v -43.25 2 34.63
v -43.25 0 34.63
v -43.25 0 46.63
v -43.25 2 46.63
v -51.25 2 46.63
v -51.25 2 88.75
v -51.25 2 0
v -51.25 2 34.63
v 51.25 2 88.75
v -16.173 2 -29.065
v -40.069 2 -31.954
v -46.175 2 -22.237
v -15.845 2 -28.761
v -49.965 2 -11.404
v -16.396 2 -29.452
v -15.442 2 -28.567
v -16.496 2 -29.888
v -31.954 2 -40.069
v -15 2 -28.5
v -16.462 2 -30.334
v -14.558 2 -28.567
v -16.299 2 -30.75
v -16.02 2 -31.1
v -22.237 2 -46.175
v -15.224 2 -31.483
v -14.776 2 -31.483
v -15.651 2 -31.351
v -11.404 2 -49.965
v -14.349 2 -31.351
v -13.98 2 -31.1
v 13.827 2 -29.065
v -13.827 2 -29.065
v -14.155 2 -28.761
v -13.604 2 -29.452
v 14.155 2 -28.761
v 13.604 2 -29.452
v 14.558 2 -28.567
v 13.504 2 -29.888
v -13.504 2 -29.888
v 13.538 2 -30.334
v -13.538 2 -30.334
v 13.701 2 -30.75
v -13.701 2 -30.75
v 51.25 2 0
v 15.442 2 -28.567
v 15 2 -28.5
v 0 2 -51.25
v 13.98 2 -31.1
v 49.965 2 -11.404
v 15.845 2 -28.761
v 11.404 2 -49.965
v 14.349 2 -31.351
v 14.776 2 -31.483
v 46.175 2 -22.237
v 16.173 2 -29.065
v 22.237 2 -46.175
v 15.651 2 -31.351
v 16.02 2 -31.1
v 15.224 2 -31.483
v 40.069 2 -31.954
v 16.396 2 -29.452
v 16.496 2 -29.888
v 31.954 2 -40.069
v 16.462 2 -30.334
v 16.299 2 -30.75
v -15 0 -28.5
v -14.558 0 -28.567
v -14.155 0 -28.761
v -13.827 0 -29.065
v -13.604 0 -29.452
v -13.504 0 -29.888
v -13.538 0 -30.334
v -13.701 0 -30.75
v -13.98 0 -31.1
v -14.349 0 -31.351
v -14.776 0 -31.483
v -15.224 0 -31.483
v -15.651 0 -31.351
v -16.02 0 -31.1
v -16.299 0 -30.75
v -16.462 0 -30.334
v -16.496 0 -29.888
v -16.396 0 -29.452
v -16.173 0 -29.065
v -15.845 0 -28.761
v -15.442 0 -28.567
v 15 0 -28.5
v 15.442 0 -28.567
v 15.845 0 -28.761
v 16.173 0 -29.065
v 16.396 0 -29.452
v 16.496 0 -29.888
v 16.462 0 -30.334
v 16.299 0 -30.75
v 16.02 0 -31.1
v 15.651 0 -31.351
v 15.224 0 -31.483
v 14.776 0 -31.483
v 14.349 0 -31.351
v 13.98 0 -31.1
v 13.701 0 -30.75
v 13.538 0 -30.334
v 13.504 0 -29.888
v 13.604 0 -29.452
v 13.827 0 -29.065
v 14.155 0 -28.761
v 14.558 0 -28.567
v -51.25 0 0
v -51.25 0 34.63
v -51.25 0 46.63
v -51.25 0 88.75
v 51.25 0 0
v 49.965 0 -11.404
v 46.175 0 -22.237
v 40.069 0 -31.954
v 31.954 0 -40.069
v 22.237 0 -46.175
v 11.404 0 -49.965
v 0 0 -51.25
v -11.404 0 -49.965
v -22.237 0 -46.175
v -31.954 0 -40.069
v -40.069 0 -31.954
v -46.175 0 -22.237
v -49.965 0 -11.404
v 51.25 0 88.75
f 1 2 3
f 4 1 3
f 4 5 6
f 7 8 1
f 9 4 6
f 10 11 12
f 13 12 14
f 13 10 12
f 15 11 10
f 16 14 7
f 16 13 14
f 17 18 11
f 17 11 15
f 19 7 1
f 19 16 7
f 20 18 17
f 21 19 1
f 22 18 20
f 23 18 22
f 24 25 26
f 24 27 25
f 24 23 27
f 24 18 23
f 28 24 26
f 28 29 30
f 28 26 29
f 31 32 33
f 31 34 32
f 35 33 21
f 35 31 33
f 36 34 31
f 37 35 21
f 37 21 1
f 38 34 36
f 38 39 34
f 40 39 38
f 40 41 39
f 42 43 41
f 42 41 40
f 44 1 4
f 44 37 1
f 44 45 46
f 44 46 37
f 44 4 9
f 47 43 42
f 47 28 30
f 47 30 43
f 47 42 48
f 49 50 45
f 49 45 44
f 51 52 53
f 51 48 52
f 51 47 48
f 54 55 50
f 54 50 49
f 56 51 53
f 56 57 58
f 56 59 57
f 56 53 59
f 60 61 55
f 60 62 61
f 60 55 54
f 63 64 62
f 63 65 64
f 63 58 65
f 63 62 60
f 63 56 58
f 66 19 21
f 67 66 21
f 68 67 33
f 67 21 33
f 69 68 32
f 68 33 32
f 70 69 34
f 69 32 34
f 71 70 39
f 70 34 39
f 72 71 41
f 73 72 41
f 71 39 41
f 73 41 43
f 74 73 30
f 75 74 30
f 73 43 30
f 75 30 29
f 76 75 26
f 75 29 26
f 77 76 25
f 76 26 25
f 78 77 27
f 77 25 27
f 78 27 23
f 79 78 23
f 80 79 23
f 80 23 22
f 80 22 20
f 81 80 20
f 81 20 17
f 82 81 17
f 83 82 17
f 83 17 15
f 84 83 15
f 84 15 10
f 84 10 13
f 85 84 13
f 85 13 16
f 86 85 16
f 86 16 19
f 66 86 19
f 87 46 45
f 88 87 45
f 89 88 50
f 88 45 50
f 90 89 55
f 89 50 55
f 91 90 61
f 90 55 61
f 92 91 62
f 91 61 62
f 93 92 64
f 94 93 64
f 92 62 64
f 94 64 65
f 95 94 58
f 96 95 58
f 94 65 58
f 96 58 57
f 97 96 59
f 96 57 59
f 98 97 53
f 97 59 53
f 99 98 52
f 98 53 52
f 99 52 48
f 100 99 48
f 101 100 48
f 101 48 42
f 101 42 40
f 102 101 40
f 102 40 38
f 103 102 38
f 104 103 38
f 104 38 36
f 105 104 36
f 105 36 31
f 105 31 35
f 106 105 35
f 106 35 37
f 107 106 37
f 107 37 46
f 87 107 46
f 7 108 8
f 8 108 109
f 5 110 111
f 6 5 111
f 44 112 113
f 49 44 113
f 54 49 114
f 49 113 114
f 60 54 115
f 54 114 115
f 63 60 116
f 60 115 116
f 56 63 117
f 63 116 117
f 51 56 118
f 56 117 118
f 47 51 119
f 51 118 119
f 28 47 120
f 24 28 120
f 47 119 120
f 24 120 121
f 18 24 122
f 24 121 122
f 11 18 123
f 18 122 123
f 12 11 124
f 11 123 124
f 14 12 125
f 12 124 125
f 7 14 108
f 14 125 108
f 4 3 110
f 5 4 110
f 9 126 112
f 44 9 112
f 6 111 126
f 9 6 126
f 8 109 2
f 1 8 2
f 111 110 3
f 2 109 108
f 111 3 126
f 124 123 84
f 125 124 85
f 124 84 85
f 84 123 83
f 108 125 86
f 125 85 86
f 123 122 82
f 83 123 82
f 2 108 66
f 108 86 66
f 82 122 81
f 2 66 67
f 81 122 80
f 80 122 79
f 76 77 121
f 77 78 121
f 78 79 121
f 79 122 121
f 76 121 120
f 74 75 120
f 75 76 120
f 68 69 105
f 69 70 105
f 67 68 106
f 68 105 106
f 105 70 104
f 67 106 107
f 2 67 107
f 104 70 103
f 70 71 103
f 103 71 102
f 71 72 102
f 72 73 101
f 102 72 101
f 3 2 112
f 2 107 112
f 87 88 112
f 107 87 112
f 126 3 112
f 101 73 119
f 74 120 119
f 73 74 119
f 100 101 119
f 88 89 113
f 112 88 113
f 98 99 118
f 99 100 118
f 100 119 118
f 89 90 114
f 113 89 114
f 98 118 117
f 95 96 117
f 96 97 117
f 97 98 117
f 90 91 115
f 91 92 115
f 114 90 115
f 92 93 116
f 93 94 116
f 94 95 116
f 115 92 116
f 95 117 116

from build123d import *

# Parameters (mm, degrees)
BOSS_EXTRU_1_DEPTH      = 2
ESQUISSE4_R             = 1.5
ENL_V_MAT_EXTRU_1_DEPTH = 10


with BuildPart() as part:
    # Esquisse1 → Boss.-Extru.1 (new body)
    with BuildSketch(Plane(origin=(0, 0, 0), x_dir=(1, 0, 0), z_dir=(0, 1, 0))):
        with BuildLine():
            Line((-51.25, 0), (-51.25, -34.62957381))
            Line((-51.25, -34.62957381), (-43.25, -34.62957381))
            Line((-43.25, -34.62957381), (-43.25, -46.62957381))
            Line((-43.25, -46.62957381), (-51.25, -46.62957381))
            Line((-51.25, -46.62957381), (-51.25, -88.75))
            Line((-51.25, -88.75), (51.25, -88.75))
            Line((51.25, -88.75), (51.25, 0))
            ThreePointArc((51.25, 0), (0, 51.25), (-51.25, 0))
        make_face()
    extrude(amount=BOSS_EXTRU_1_DEPTH)

    # Esquisse4 → Enlèv. mat.-Extru.1 (cut)
    with BuildSketch(Plane(origin=(0, 2, 0), x_dir=(1, 0, 0), z_dir=(0, 1, 0))):
        with Locations(Location((15, 30, 0), (0, 0, 270))):
            Circle(ESQUISSE4_R)
        with Locations(Location((-15, 30, 0), (0, 0, 270))):
            Circle(ESQUISSE4_R)
    extrude(amount=-ENL_V_MAT_EXTRU_1_DEPTH, mode=Mode.SUBTRACT)


solid = part.part
